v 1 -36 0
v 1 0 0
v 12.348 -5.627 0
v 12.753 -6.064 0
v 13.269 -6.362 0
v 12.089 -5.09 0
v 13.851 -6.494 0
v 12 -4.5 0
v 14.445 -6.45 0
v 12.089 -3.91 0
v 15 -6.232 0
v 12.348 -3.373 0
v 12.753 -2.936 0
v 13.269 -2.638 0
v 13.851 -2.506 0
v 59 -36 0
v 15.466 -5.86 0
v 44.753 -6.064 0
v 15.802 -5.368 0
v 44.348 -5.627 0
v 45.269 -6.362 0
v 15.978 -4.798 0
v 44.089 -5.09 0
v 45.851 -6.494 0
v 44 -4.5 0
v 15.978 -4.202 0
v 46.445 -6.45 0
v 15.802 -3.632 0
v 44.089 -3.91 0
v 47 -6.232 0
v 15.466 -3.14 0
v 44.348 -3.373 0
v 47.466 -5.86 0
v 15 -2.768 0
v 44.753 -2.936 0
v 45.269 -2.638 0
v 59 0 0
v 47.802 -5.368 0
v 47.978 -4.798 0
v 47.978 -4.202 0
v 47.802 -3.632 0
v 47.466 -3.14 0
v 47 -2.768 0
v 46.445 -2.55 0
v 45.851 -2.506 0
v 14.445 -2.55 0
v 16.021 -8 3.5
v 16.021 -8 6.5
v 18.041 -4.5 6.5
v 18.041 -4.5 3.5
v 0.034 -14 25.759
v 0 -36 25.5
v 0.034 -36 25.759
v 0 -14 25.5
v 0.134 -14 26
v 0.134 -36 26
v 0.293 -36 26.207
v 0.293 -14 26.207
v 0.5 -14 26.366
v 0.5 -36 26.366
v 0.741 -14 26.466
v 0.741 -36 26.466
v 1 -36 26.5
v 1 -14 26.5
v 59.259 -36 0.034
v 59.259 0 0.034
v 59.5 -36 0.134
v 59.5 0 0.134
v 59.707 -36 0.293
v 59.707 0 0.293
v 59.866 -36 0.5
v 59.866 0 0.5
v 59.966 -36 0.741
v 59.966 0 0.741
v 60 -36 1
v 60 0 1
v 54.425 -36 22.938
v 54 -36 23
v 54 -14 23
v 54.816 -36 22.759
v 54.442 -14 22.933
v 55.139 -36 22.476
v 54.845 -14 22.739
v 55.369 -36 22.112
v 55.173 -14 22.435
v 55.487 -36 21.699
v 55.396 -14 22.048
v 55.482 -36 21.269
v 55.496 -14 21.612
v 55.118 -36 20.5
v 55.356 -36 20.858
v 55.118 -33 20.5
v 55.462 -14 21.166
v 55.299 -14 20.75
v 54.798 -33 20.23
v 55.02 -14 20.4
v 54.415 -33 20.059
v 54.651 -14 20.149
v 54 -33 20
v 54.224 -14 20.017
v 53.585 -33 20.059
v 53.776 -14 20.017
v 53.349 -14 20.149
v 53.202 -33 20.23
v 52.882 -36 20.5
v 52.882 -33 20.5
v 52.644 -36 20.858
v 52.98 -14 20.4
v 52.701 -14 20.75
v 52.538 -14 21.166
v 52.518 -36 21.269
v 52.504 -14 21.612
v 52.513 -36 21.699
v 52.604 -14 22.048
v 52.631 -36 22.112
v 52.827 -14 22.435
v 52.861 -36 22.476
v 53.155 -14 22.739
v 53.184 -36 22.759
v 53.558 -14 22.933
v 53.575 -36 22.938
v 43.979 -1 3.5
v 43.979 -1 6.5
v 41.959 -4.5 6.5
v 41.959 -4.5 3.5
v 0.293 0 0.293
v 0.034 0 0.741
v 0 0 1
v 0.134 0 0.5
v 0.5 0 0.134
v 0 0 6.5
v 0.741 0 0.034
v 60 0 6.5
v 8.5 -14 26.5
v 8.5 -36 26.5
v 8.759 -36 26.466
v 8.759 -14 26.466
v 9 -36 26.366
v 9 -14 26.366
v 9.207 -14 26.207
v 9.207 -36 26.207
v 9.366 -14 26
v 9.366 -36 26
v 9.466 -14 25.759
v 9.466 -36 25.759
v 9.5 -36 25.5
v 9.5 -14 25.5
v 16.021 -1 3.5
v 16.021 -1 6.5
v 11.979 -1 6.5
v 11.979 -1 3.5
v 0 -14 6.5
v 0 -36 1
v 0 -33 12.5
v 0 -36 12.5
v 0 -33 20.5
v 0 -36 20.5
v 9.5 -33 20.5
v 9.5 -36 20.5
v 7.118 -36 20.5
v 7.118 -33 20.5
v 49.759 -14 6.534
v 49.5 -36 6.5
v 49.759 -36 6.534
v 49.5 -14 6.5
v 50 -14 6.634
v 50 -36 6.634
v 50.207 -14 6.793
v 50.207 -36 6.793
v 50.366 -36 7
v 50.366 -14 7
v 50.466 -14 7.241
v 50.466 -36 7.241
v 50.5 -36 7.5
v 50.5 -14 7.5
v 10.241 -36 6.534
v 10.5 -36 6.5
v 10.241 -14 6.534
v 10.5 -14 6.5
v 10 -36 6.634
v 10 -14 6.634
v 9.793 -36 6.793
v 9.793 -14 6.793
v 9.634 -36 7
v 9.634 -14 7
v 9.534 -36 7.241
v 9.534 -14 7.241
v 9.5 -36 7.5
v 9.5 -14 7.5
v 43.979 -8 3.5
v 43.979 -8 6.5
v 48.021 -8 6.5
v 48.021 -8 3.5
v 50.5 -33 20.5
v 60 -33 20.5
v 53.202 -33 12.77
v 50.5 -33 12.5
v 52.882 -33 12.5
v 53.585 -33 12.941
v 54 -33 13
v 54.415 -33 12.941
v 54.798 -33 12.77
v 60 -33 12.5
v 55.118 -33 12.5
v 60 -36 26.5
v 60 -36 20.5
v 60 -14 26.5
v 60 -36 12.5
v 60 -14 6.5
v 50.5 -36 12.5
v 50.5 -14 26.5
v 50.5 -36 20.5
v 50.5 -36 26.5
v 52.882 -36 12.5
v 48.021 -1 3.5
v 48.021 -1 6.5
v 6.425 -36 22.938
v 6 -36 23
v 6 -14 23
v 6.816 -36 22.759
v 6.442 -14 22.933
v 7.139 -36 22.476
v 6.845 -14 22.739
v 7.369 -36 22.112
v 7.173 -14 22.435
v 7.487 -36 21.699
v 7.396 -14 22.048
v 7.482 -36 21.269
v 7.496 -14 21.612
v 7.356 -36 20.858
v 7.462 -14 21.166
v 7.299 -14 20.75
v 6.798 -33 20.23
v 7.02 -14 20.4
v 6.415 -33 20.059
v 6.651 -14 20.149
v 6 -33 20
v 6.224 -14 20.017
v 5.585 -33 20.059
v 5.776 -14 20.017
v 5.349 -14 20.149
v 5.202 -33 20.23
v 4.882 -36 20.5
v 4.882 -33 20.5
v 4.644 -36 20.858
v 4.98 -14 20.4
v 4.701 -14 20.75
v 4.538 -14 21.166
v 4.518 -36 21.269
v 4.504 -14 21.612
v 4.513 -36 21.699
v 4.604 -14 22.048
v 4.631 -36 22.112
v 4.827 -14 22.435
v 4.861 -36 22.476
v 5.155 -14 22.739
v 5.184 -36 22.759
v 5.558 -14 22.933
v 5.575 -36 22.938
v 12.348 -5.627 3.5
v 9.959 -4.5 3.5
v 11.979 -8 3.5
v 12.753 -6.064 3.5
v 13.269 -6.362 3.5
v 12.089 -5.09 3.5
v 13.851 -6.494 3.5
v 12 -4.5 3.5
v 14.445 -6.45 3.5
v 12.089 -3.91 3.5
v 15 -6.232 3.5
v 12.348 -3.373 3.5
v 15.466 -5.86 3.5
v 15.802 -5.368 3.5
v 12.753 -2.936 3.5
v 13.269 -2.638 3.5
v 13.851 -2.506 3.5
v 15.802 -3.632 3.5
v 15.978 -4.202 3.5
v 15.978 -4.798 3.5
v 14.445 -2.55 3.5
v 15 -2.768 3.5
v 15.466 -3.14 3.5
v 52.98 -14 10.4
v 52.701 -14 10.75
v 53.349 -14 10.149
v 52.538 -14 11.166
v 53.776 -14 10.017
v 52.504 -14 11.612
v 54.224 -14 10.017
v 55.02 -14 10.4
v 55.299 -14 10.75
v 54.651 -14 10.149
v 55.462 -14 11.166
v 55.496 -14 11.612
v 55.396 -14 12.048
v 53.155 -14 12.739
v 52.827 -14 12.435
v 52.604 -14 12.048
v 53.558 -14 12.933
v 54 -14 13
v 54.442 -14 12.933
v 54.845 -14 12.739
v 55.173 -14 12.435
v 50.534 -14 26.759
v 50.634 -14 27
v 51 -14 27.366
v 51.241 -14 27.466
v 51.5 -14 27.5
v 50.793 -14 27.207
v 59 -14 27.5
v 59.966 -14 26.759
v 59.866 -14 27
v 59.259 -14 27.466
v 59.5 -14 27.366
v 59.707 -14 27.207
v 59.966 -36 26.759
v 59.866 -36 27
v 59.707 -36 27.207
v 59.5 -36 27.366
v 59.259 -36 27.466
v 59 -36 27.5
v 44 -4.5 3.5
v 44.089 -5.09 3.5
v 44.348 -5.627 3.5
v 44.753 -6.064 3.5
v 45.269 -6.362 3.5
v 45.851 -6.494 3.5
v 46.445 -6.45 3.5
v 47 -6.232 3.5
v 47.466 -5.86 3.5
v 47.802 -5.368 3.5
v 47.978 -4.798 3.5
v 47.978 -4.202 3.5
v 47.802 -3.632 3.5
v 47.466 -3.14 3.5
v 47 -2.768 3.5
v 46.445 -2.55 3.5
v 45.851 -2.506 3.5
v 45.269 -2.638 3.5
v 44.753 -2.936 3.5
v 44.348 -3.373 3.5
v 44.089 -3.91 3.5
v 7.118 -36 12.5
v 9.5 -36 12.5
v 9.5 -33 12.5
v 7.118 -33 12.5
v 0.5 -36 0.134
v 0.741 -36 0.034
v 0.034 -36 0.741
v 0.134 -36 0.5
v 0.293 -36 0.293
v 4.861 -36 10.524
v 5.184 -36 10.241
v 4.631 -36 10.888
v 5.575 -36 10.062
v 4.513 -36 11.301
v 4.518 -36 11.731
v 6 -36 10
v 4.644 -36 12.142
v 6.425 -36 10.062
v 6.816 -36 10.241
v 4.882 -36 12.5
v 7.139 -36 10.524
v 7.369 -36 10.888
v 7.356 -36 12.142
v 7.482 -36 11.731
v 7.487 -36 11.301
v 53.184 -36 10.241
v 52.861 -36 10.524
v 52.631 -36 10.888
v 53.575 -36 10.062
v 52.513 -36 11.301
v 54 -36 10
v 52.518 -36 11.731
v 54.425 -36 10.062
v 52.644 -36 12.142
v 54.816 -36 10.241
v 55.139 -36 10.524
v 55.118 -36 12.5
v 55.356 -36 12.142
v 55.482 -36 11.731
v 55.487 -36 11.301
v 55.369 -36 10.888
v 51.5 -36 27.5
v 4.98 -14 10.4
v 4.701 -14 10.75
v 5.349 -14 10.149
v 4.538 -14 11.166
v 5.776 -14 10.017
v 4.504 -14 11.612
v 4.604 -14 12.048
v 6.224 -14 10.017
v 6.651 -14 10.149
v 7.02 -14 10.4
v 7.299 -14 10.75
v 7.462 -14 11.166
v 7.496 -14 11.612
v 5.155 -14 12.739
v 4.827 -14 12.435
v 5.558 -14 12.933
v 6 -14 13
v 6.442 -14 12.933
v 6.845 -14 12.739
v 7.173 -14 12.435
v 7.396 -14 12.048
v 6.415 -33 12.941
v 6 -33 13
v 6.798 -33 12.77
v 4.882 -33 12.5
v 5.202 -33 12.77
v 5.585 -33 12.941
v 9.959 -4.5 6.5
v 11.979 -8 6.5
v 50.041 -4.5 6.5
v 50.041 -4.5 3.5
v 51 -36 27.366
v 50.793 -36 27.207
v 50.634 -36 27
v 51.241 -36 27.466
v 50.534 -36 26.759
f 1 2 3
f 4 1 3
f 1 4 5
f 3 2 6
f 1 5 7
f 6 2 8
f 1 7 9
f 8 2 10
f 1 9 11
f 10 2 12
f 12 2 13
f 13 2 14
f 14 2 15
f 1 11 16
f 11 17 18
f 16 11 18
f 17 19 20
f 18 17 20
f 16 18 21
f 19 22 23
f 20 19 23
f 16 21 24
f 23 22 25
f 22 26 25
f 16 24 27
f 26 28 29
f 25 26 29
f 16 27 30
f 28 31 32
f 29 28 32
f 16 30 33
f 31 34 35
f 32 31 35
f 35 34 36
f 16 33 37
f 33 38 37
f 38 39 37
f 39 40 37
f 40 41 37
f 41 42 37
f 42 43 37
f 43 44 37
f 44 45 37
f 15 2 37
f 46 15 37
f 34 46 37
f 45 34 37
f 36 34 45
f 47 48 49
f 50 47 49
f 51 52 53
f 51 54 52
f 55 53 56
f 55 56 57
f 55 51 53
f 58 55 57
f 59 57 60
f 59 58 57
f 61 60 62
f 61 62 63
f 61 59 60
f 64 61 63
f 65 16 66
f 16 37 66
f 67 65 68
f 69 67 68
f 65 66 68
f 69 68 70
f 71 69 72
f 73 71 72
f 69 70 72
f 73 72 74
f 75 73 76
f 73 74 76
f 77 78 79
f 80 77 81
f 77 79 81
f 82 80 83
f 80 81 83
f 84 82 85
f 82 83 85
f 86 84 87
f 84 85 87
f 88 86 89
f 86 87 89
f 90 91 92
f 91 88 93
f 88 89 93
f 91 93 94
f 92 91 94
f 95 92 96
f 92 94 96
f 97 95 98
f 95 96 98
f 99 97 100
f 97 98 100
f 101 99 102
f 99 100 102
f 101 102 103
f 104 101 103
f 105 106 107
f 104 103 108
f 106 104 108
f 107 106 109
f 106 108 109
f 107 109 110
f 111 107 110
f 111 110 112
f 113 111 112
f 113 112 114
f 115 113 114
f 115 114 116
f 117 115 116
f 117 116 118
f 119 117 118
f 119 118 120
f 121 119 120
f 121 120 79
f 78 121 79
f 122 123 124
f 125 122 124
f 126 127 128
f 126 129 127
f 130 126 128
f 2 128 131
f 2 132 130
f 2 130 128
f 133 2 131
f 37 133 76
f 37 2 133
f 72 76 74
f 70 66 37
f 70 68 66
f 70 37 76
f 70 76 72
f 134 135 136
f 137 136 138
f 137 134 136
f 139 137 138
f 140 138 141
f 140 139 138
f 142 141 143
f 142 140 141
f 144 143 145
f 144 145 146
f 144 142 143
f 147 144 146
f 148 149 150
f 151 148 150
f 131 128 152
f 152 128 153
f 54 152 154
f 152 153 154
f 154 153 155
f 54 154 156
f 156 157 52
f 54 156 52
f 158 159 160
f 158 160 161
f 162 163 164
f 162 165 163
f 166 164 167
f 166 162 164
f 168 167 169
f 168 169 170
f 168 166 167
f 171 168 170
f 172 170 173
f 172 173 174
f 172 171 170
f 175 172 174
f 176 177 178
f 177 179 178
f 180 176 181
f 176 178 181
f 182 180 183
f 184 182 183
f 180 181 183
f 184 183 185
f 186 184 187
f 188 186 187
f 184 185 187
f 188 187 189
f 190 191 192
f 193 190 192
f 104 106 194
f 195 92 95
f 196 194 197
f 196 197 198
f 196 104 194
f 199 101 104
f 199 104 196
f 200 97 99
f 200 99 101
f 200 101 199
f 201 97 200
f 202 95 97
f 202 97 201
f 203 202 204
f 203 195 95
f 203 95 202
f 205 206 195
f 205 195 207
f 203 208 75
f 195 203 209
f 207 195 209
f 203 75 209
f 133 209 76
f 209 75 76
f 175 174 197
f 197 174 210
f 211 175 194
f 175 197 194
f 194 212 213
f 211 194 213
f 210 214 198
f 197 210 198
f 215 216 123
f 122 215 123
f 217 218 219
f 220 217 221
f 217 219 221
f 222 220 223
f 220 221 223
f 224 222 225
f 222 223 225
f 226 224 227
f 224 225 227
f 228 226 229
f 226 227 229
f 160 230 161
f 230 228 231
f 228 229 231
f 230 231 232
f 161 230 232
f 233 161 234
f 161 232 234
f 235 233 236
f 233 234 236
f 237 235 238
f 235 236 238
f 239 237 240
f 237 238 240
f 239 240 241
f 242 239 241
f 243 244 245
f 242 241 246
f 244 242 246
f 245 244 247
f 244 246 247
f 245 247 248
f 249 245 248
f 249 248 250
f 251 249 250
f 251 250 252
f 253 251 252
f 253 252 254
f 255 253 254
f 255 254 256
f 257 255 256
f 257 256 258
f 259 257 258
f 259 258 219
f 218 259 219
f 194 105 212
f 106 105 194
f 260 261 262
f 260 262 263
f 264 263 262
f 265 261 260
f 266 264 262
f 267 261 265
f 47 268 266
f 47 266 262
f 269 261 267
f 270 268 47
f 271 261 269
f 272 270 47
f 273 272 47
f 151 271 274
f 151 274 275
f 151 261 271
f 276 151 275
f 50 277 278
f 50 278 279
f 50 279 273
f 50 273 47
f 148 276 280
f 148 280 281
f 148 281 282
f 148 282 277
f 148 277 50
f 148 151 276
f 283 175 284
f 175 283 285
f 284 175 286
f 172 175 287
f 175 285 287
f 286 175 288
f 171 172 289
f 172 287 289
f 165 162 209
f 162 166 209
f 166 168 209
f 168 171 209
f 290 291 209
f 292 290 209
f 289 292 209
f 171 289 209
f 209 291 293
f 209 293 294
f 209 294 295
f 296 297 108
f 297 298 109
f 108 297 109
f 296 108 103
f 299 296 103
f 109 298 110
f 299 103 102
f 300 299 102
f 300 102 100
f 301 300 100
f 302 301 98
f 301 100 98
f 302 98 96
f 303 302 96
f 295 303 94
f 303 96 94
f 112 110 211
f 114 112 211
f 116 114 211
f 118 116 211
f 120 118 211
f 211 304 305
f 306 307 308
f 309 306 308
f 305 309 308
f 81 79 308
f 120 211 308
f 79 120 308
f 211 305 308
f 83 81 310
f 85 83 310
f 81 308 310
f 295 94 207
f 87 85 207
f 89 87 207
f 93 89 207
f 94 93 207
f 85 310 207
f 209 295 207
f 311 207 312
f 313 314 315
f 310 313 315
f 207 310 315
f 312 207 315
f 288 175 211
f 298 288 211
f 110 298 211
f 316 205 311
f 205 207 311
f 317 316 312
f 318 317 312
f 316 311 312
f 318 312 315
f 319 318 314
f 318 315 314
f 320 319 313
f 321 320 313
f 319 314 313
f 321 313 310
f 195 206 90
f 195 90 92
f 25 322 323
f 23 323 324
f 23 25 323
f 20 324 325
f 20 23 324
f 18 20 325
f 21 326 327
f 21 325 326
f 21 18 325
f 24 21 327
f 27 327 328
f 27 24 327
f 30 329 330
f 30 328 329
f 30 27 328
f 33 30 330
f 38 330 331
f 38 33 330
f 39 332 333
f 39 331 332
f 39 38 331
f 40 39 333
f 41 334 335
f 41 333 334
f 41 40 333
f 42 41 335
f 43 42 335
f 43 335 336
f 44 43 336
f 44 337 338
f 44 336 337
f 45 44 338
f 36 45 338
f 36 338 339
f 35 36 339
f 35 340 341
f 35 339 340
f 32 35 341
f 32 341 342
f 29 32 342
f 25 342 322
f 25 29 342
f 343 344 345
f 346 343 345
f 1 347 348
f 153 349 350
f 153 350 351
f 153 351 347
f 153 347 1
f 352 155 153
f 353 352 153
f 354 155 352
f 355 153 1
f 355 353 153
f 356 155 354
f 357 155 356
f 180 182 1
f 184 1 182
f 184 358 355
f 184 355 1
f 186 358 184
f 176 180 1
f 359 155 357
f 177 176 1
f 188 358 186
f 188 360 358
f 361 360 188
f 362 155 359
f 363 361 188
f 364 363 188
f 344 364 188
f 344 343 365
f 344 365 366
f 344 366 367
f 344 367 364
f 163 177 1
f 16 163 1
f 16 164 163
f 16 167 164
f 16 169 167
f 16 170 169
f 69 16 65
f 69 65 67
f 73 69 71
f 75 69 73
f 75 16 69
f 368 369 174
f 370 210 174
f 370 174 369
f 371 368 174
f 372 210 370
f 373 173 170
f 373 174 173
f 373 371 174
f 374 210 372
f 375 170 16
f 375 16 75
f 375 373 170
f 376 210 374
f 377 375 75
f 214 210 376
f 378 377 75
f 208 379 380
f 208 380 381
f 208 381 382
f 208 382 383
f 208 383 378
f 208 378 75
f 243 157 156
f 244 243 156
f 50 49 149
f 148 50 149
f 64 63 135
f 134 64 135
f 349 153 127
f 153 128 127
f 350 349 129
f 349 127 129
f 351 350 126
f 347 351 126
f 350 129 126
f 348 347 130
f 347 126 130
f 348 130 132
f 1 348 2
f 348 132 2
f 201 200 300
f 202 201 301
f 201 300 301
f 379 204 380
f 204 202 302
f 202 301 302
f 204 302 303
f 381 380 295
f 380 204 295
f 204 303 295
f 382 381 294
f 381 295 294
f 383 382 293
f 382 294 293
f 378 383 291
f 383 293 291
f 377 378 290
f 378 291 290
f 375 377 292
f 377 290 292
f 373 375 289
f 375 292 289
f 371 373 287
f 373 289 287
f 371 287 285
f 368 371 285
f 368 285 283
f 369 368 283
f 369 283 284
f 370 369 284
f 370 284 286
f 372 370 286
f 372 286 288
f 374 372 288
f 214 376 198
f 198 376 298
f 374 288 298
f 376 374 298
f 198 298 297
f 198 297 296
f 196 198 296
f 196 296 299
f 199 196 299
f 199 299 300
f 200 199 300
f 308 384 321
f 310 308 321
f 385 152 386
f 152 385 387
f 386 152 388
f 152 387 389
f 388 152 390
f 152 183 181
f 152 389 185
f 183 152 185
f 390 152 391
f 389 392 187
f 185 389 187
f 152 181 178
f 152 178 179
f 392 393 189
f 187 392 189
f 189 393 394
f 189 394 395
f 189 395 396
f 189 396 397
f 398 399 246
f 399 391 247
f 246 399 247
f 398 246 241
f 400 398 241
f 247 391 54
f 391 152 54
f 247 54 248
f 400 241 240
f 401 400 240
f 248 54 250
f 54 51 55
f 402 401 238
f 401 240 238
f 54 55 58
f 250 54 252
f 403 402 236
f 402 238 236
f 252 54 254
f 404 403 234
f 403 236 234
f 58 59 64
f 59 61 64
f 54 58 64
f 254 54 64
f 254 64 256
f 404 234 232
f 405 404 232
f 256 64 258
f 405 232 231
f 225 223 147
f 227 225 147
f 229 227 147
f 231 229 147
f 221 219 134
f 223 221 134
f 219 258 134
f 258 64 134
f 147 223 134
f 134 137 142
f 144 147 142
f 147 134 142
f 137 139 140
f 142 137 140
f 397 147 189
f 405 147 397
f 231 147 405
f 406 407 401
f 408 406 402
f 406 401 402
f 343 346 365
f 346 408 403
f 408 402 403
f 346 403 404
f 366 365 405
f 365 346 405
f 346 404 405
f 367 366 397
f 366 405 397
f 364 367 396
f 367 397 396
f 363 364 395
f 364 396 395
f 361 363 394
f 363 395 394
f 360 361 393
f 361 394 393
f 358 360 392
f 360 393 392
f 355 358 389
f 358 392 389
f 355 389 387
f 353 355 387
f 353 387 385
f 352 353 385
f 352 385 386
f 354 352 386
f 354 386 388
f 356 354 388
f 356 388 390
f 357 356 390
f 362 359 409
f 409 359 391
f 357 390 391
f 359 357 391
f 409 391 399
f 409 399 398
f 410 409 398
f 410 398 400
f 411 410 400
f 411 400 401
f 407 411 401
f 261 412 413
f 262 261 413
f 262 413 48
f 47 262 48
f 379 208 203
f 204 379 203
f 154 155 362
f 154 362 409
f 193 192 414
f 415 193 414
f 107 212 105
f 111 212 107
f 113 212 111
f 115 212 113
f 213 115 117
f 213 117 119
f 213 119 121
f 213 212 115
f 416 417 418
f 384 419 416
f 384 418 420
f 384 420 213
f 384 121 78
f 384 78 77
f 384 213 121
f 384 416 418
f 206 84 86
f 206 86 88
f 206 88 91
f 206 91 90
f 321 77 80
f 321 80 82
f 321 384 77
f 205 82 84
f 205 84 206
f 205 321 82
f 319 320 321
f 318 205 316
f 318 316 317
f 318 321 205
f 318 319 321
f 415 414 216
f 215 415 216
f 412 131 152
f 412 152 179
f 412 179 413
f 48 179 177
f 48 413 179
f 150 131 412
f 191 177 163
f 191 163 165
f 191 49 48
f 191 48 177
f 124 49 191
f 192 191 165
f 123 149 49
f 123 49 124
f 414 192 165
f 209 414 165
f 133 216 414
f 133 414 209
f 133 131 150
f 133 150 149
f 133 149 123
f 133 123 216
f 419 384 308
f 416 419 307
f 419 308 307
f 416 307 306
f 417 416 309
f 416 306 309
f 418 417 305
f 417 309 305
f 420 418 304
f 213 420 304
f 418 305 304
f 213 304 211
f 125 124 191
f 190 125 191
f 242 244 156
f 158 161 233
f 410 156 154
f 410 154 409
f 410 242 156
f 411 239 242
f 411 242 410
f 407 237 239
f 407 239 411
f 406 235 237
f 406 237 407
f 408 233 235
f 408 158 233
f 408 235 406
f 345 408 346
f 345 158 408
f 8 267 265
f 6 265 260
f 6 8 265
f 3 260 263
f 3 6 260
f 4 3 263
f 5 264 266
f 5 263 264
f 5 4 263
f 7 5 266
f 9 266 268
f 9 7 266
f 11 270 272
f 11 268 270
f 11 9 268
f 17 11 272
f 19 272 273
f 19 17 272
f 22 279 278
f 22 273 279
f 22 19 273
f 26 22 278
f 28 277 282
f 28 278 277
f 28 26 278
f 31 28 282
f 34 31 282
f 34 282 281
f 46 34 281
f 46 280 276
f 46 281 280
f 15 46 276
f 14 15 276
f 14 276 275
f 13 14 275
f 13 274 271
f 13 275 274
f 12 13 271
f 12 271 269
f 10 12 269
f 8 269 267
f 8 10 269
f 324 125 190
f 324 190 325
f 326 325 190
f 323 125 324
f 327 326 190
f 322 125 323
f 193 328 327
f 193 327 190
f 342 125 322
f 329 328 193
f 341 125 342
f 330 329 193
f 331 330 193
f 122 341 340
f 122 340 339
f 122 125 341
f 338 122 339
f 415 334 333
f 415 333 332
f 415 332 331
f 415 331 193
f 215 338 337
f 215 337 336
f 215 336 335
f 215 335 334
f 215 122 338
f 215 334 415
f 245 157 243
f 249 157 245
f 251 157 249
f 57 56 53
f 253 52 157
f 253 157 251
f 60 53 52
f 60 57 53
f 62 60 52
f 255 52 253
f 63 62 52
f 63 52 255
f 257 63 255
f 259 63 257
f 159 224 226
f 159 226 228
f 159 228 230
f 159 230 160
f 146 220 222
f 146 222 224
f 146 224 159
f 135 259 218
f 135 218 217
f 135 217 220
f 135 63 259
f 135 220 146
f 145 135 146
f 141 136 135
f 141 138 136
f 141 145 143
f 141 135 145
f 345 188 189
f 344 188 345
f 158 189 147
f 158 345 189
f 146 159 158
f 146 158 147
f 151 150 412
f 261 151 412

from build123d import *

# Parameters (mm, degrees)
SKETCH1_W           = 60
SKETCH1_H           = 36
SKETCH1_R           = 2
BOSS_EXTRUDE1_DEPTH = 6.5
SKETCH2_W           = 9.5
SKETCH2_H           = 20
SKETCH2_H_2         = 21
BOSS_EXTRUDE2_DEPTH = 22
CUT_EXTRUDE1_REACH  = 71.572
SKETCH3_R           = 1.5
CUT_EXTRUDE2_DEPTH  = 3
LPATTERN1_COUNT     = 2
LPATTERN1_PITCH     = 32
FILLET1_R           = 1
SKETCH6_W           = 8
SKETCH6_H           = 3
CUT_EXTRUDE3_DEPTH  = 76.181447179


with BuildPart() as part:
    # Sketch1 → Boss-Extrude1 (new body)
    with BuildSketch(Plane.XY):
        with Locations((30, -18)):
            Rectangle(SKETCH1_W, SKETCH1_H)
        with Locations(Location((14, -4.5, 0), (0, 0, 180))):
            Circle(SKETCH1_R, mode=Mode.SUBTRACT)
        with Locations(Location((46, -4.5, 0), (0, 0, 180))):
            Circle(SKETCH1_R, mode=Mode.SUBTRACT)
    extrude(amount=BOSS_EXTRUDE1_DEPTH)

    # Sketch2 → Boss-Extrude2 (add)
    with BuildSketch(Plane.XZ.offset(36)):
        with Locations((4.75, 16.5)):
            Rectangle(SKETCH2_W, SKETCH2_H)
        with Locations((55.25, 17)):
            Rectangle(SKETCH2_W, SKETCH2_H_2)
    extrude(amount=-BOSS_EXTRUDE2_DEPTH)

    # Sketch3 → Cut-Extrude1 (cut, up to next)
    with BuildSketch(Plane(origin=(0, -14, 0), x_dir=(1, 0, 0), z_dir=(0, 1, 0)), mode=Mode.PRIVATE) as cut_extrude1_sk1:
        with Locations(Location((6, -11.5, 0), (0, 0, 270))):
            Circle(SKETCH3_R)
    cut_extrude1_tool1 = extrude(cut_extrude1_sk1.sketch, amount=-CUT_EXTRUDE1_REACH, mode=Mode.PRIVATE) & part.part
    # Sketch3 → Cut-Extrude1 (cut, up to next)
    with BuildSketch(Plane(origin=(0, -14, 0), x_dir=(1, 0, 0), z_dir=(0, 1, 0)), mode=Mode.PRIVATE) as cut_extrude1_sk2:
        with Locations(Location((54, -11.5, 0), (0, 0, 270))):
            Circle(SKETCH3_R)
    cut_extrude1_tool2 = extrude(cut_extrude1_sk2.sketch, amount=-CUT_EXTRUDE1_REACH, mode=Mode.PRIVATE) & part.part
    # Sketch3 → Cut-Extrude1 (cut, up to next)
    with BuildSketch(Plane(origin=(0, -14, 0), x_dir=(1, 0, 0), z_dir=(0, 1, 0)), mode=Mode.PRIVATE) as cut_extrude1_sk3:
        with Locations(Location((54, -21.5, 0), (0, 0, 270))):
            Circle(SKETCH3_R)
    cut_extrude1_tool3 = extrude(cut_extrude1_sk3.sketch, amount=-CUT_EXTRUDE1_REACH, mode=Mode.PRIVATE) & part.part
    # Sketch3 → Cut-Extrude1 (cut, up to next)
    with BuildSketch(Plane(origin=(0, -14, 0), x_dir=(1, 0, 0), z_dir=(0, 1, 0)), mode=Mode.PRIVATE) as cut_extrude1_sk4:
        with Locations(Location((6, -21.5, 0), (0, 0, 270))):
            Circle(SKETCH3_R)
    cut_extrude1_tool4 = extrude(cut_extrude1_sk4.sketch, amount=-CUT_EXTRUDE1_REACH, mode=Mode.PRIVATE) & part.part
    add(cut_extrude1_tool1.solids().sort_by_distance((6, -14, 11.5))[0], mode=Mode.SUBTRACT)
    add(cut_extrude1_tool2.solids().sort_by_distance((54, -14, 11.5))[0], mode=Mode.SUBTRACT)
    add(cut_extrude1_tool3.solids().sort_by_distance((54, -14, 21.5))[0], mode=Mode.SUBTRACT)
    add(cut_extrude1_tool4.solids().sort_by_distance((6, -14, 21.5))[0], mode=Mode.SUBTRACT)

    # Sketch4 → Cut-Extrude2 (cut)
    with BuildSketch(Plane.XY.offset(6.5)):
        Polygon((11.979274058, -1), (9.958548116, -4.5), (11.979274058, -8), (16.020725942, -8), (18.041451884, -4.5), (16.020725942, -1), align=None)
    cut_extrude2 = extrude(amount=-CUT_EXTRUDE2_DEPTH, mode=Mode.SUBTRACT)

    # LPattern1: Cut-Extrude2 ×2
    with Locations(*[(i * LPATTERN1_PITCH, 0, 0) for i in range(1, LPATTERN1_COUNT)]):
        add(cut_extrude2, mode=Mode.SUBTRACT)

    # Fillet1
    fillet1_edges = [part.edges().sort_by_distance(p)[0] for p in [
        (0, -25, 26.5),
        (9.5, -25, 26.5),
        (9.5, -25, 6.5),
        (60, -25, 27.5),
        (50.5, -25, 6.5),
        (50.5, -25, 27.5),
        (60, -18, 0),
        (0, -18, 0),
    ]]
    fillet(fillet1_edges, radius=FILLET1_R)

    # Sketch6 → Cut-Extrude3 (cut, through all)
    with BuildSketch(Plane(origin=(60, 0, 0), x_dir=(0, 0, -1), z_dir=(1, 0, 0))):
        with Locations((-16.5, -34.5)):
            Rectangle(SKETCH6_W, SKETCH6_H)
    extrude(amount=-CUT_EXTRUDE3_DEPTH, mode=Mode.SUBTRACT)


solid = part.part
